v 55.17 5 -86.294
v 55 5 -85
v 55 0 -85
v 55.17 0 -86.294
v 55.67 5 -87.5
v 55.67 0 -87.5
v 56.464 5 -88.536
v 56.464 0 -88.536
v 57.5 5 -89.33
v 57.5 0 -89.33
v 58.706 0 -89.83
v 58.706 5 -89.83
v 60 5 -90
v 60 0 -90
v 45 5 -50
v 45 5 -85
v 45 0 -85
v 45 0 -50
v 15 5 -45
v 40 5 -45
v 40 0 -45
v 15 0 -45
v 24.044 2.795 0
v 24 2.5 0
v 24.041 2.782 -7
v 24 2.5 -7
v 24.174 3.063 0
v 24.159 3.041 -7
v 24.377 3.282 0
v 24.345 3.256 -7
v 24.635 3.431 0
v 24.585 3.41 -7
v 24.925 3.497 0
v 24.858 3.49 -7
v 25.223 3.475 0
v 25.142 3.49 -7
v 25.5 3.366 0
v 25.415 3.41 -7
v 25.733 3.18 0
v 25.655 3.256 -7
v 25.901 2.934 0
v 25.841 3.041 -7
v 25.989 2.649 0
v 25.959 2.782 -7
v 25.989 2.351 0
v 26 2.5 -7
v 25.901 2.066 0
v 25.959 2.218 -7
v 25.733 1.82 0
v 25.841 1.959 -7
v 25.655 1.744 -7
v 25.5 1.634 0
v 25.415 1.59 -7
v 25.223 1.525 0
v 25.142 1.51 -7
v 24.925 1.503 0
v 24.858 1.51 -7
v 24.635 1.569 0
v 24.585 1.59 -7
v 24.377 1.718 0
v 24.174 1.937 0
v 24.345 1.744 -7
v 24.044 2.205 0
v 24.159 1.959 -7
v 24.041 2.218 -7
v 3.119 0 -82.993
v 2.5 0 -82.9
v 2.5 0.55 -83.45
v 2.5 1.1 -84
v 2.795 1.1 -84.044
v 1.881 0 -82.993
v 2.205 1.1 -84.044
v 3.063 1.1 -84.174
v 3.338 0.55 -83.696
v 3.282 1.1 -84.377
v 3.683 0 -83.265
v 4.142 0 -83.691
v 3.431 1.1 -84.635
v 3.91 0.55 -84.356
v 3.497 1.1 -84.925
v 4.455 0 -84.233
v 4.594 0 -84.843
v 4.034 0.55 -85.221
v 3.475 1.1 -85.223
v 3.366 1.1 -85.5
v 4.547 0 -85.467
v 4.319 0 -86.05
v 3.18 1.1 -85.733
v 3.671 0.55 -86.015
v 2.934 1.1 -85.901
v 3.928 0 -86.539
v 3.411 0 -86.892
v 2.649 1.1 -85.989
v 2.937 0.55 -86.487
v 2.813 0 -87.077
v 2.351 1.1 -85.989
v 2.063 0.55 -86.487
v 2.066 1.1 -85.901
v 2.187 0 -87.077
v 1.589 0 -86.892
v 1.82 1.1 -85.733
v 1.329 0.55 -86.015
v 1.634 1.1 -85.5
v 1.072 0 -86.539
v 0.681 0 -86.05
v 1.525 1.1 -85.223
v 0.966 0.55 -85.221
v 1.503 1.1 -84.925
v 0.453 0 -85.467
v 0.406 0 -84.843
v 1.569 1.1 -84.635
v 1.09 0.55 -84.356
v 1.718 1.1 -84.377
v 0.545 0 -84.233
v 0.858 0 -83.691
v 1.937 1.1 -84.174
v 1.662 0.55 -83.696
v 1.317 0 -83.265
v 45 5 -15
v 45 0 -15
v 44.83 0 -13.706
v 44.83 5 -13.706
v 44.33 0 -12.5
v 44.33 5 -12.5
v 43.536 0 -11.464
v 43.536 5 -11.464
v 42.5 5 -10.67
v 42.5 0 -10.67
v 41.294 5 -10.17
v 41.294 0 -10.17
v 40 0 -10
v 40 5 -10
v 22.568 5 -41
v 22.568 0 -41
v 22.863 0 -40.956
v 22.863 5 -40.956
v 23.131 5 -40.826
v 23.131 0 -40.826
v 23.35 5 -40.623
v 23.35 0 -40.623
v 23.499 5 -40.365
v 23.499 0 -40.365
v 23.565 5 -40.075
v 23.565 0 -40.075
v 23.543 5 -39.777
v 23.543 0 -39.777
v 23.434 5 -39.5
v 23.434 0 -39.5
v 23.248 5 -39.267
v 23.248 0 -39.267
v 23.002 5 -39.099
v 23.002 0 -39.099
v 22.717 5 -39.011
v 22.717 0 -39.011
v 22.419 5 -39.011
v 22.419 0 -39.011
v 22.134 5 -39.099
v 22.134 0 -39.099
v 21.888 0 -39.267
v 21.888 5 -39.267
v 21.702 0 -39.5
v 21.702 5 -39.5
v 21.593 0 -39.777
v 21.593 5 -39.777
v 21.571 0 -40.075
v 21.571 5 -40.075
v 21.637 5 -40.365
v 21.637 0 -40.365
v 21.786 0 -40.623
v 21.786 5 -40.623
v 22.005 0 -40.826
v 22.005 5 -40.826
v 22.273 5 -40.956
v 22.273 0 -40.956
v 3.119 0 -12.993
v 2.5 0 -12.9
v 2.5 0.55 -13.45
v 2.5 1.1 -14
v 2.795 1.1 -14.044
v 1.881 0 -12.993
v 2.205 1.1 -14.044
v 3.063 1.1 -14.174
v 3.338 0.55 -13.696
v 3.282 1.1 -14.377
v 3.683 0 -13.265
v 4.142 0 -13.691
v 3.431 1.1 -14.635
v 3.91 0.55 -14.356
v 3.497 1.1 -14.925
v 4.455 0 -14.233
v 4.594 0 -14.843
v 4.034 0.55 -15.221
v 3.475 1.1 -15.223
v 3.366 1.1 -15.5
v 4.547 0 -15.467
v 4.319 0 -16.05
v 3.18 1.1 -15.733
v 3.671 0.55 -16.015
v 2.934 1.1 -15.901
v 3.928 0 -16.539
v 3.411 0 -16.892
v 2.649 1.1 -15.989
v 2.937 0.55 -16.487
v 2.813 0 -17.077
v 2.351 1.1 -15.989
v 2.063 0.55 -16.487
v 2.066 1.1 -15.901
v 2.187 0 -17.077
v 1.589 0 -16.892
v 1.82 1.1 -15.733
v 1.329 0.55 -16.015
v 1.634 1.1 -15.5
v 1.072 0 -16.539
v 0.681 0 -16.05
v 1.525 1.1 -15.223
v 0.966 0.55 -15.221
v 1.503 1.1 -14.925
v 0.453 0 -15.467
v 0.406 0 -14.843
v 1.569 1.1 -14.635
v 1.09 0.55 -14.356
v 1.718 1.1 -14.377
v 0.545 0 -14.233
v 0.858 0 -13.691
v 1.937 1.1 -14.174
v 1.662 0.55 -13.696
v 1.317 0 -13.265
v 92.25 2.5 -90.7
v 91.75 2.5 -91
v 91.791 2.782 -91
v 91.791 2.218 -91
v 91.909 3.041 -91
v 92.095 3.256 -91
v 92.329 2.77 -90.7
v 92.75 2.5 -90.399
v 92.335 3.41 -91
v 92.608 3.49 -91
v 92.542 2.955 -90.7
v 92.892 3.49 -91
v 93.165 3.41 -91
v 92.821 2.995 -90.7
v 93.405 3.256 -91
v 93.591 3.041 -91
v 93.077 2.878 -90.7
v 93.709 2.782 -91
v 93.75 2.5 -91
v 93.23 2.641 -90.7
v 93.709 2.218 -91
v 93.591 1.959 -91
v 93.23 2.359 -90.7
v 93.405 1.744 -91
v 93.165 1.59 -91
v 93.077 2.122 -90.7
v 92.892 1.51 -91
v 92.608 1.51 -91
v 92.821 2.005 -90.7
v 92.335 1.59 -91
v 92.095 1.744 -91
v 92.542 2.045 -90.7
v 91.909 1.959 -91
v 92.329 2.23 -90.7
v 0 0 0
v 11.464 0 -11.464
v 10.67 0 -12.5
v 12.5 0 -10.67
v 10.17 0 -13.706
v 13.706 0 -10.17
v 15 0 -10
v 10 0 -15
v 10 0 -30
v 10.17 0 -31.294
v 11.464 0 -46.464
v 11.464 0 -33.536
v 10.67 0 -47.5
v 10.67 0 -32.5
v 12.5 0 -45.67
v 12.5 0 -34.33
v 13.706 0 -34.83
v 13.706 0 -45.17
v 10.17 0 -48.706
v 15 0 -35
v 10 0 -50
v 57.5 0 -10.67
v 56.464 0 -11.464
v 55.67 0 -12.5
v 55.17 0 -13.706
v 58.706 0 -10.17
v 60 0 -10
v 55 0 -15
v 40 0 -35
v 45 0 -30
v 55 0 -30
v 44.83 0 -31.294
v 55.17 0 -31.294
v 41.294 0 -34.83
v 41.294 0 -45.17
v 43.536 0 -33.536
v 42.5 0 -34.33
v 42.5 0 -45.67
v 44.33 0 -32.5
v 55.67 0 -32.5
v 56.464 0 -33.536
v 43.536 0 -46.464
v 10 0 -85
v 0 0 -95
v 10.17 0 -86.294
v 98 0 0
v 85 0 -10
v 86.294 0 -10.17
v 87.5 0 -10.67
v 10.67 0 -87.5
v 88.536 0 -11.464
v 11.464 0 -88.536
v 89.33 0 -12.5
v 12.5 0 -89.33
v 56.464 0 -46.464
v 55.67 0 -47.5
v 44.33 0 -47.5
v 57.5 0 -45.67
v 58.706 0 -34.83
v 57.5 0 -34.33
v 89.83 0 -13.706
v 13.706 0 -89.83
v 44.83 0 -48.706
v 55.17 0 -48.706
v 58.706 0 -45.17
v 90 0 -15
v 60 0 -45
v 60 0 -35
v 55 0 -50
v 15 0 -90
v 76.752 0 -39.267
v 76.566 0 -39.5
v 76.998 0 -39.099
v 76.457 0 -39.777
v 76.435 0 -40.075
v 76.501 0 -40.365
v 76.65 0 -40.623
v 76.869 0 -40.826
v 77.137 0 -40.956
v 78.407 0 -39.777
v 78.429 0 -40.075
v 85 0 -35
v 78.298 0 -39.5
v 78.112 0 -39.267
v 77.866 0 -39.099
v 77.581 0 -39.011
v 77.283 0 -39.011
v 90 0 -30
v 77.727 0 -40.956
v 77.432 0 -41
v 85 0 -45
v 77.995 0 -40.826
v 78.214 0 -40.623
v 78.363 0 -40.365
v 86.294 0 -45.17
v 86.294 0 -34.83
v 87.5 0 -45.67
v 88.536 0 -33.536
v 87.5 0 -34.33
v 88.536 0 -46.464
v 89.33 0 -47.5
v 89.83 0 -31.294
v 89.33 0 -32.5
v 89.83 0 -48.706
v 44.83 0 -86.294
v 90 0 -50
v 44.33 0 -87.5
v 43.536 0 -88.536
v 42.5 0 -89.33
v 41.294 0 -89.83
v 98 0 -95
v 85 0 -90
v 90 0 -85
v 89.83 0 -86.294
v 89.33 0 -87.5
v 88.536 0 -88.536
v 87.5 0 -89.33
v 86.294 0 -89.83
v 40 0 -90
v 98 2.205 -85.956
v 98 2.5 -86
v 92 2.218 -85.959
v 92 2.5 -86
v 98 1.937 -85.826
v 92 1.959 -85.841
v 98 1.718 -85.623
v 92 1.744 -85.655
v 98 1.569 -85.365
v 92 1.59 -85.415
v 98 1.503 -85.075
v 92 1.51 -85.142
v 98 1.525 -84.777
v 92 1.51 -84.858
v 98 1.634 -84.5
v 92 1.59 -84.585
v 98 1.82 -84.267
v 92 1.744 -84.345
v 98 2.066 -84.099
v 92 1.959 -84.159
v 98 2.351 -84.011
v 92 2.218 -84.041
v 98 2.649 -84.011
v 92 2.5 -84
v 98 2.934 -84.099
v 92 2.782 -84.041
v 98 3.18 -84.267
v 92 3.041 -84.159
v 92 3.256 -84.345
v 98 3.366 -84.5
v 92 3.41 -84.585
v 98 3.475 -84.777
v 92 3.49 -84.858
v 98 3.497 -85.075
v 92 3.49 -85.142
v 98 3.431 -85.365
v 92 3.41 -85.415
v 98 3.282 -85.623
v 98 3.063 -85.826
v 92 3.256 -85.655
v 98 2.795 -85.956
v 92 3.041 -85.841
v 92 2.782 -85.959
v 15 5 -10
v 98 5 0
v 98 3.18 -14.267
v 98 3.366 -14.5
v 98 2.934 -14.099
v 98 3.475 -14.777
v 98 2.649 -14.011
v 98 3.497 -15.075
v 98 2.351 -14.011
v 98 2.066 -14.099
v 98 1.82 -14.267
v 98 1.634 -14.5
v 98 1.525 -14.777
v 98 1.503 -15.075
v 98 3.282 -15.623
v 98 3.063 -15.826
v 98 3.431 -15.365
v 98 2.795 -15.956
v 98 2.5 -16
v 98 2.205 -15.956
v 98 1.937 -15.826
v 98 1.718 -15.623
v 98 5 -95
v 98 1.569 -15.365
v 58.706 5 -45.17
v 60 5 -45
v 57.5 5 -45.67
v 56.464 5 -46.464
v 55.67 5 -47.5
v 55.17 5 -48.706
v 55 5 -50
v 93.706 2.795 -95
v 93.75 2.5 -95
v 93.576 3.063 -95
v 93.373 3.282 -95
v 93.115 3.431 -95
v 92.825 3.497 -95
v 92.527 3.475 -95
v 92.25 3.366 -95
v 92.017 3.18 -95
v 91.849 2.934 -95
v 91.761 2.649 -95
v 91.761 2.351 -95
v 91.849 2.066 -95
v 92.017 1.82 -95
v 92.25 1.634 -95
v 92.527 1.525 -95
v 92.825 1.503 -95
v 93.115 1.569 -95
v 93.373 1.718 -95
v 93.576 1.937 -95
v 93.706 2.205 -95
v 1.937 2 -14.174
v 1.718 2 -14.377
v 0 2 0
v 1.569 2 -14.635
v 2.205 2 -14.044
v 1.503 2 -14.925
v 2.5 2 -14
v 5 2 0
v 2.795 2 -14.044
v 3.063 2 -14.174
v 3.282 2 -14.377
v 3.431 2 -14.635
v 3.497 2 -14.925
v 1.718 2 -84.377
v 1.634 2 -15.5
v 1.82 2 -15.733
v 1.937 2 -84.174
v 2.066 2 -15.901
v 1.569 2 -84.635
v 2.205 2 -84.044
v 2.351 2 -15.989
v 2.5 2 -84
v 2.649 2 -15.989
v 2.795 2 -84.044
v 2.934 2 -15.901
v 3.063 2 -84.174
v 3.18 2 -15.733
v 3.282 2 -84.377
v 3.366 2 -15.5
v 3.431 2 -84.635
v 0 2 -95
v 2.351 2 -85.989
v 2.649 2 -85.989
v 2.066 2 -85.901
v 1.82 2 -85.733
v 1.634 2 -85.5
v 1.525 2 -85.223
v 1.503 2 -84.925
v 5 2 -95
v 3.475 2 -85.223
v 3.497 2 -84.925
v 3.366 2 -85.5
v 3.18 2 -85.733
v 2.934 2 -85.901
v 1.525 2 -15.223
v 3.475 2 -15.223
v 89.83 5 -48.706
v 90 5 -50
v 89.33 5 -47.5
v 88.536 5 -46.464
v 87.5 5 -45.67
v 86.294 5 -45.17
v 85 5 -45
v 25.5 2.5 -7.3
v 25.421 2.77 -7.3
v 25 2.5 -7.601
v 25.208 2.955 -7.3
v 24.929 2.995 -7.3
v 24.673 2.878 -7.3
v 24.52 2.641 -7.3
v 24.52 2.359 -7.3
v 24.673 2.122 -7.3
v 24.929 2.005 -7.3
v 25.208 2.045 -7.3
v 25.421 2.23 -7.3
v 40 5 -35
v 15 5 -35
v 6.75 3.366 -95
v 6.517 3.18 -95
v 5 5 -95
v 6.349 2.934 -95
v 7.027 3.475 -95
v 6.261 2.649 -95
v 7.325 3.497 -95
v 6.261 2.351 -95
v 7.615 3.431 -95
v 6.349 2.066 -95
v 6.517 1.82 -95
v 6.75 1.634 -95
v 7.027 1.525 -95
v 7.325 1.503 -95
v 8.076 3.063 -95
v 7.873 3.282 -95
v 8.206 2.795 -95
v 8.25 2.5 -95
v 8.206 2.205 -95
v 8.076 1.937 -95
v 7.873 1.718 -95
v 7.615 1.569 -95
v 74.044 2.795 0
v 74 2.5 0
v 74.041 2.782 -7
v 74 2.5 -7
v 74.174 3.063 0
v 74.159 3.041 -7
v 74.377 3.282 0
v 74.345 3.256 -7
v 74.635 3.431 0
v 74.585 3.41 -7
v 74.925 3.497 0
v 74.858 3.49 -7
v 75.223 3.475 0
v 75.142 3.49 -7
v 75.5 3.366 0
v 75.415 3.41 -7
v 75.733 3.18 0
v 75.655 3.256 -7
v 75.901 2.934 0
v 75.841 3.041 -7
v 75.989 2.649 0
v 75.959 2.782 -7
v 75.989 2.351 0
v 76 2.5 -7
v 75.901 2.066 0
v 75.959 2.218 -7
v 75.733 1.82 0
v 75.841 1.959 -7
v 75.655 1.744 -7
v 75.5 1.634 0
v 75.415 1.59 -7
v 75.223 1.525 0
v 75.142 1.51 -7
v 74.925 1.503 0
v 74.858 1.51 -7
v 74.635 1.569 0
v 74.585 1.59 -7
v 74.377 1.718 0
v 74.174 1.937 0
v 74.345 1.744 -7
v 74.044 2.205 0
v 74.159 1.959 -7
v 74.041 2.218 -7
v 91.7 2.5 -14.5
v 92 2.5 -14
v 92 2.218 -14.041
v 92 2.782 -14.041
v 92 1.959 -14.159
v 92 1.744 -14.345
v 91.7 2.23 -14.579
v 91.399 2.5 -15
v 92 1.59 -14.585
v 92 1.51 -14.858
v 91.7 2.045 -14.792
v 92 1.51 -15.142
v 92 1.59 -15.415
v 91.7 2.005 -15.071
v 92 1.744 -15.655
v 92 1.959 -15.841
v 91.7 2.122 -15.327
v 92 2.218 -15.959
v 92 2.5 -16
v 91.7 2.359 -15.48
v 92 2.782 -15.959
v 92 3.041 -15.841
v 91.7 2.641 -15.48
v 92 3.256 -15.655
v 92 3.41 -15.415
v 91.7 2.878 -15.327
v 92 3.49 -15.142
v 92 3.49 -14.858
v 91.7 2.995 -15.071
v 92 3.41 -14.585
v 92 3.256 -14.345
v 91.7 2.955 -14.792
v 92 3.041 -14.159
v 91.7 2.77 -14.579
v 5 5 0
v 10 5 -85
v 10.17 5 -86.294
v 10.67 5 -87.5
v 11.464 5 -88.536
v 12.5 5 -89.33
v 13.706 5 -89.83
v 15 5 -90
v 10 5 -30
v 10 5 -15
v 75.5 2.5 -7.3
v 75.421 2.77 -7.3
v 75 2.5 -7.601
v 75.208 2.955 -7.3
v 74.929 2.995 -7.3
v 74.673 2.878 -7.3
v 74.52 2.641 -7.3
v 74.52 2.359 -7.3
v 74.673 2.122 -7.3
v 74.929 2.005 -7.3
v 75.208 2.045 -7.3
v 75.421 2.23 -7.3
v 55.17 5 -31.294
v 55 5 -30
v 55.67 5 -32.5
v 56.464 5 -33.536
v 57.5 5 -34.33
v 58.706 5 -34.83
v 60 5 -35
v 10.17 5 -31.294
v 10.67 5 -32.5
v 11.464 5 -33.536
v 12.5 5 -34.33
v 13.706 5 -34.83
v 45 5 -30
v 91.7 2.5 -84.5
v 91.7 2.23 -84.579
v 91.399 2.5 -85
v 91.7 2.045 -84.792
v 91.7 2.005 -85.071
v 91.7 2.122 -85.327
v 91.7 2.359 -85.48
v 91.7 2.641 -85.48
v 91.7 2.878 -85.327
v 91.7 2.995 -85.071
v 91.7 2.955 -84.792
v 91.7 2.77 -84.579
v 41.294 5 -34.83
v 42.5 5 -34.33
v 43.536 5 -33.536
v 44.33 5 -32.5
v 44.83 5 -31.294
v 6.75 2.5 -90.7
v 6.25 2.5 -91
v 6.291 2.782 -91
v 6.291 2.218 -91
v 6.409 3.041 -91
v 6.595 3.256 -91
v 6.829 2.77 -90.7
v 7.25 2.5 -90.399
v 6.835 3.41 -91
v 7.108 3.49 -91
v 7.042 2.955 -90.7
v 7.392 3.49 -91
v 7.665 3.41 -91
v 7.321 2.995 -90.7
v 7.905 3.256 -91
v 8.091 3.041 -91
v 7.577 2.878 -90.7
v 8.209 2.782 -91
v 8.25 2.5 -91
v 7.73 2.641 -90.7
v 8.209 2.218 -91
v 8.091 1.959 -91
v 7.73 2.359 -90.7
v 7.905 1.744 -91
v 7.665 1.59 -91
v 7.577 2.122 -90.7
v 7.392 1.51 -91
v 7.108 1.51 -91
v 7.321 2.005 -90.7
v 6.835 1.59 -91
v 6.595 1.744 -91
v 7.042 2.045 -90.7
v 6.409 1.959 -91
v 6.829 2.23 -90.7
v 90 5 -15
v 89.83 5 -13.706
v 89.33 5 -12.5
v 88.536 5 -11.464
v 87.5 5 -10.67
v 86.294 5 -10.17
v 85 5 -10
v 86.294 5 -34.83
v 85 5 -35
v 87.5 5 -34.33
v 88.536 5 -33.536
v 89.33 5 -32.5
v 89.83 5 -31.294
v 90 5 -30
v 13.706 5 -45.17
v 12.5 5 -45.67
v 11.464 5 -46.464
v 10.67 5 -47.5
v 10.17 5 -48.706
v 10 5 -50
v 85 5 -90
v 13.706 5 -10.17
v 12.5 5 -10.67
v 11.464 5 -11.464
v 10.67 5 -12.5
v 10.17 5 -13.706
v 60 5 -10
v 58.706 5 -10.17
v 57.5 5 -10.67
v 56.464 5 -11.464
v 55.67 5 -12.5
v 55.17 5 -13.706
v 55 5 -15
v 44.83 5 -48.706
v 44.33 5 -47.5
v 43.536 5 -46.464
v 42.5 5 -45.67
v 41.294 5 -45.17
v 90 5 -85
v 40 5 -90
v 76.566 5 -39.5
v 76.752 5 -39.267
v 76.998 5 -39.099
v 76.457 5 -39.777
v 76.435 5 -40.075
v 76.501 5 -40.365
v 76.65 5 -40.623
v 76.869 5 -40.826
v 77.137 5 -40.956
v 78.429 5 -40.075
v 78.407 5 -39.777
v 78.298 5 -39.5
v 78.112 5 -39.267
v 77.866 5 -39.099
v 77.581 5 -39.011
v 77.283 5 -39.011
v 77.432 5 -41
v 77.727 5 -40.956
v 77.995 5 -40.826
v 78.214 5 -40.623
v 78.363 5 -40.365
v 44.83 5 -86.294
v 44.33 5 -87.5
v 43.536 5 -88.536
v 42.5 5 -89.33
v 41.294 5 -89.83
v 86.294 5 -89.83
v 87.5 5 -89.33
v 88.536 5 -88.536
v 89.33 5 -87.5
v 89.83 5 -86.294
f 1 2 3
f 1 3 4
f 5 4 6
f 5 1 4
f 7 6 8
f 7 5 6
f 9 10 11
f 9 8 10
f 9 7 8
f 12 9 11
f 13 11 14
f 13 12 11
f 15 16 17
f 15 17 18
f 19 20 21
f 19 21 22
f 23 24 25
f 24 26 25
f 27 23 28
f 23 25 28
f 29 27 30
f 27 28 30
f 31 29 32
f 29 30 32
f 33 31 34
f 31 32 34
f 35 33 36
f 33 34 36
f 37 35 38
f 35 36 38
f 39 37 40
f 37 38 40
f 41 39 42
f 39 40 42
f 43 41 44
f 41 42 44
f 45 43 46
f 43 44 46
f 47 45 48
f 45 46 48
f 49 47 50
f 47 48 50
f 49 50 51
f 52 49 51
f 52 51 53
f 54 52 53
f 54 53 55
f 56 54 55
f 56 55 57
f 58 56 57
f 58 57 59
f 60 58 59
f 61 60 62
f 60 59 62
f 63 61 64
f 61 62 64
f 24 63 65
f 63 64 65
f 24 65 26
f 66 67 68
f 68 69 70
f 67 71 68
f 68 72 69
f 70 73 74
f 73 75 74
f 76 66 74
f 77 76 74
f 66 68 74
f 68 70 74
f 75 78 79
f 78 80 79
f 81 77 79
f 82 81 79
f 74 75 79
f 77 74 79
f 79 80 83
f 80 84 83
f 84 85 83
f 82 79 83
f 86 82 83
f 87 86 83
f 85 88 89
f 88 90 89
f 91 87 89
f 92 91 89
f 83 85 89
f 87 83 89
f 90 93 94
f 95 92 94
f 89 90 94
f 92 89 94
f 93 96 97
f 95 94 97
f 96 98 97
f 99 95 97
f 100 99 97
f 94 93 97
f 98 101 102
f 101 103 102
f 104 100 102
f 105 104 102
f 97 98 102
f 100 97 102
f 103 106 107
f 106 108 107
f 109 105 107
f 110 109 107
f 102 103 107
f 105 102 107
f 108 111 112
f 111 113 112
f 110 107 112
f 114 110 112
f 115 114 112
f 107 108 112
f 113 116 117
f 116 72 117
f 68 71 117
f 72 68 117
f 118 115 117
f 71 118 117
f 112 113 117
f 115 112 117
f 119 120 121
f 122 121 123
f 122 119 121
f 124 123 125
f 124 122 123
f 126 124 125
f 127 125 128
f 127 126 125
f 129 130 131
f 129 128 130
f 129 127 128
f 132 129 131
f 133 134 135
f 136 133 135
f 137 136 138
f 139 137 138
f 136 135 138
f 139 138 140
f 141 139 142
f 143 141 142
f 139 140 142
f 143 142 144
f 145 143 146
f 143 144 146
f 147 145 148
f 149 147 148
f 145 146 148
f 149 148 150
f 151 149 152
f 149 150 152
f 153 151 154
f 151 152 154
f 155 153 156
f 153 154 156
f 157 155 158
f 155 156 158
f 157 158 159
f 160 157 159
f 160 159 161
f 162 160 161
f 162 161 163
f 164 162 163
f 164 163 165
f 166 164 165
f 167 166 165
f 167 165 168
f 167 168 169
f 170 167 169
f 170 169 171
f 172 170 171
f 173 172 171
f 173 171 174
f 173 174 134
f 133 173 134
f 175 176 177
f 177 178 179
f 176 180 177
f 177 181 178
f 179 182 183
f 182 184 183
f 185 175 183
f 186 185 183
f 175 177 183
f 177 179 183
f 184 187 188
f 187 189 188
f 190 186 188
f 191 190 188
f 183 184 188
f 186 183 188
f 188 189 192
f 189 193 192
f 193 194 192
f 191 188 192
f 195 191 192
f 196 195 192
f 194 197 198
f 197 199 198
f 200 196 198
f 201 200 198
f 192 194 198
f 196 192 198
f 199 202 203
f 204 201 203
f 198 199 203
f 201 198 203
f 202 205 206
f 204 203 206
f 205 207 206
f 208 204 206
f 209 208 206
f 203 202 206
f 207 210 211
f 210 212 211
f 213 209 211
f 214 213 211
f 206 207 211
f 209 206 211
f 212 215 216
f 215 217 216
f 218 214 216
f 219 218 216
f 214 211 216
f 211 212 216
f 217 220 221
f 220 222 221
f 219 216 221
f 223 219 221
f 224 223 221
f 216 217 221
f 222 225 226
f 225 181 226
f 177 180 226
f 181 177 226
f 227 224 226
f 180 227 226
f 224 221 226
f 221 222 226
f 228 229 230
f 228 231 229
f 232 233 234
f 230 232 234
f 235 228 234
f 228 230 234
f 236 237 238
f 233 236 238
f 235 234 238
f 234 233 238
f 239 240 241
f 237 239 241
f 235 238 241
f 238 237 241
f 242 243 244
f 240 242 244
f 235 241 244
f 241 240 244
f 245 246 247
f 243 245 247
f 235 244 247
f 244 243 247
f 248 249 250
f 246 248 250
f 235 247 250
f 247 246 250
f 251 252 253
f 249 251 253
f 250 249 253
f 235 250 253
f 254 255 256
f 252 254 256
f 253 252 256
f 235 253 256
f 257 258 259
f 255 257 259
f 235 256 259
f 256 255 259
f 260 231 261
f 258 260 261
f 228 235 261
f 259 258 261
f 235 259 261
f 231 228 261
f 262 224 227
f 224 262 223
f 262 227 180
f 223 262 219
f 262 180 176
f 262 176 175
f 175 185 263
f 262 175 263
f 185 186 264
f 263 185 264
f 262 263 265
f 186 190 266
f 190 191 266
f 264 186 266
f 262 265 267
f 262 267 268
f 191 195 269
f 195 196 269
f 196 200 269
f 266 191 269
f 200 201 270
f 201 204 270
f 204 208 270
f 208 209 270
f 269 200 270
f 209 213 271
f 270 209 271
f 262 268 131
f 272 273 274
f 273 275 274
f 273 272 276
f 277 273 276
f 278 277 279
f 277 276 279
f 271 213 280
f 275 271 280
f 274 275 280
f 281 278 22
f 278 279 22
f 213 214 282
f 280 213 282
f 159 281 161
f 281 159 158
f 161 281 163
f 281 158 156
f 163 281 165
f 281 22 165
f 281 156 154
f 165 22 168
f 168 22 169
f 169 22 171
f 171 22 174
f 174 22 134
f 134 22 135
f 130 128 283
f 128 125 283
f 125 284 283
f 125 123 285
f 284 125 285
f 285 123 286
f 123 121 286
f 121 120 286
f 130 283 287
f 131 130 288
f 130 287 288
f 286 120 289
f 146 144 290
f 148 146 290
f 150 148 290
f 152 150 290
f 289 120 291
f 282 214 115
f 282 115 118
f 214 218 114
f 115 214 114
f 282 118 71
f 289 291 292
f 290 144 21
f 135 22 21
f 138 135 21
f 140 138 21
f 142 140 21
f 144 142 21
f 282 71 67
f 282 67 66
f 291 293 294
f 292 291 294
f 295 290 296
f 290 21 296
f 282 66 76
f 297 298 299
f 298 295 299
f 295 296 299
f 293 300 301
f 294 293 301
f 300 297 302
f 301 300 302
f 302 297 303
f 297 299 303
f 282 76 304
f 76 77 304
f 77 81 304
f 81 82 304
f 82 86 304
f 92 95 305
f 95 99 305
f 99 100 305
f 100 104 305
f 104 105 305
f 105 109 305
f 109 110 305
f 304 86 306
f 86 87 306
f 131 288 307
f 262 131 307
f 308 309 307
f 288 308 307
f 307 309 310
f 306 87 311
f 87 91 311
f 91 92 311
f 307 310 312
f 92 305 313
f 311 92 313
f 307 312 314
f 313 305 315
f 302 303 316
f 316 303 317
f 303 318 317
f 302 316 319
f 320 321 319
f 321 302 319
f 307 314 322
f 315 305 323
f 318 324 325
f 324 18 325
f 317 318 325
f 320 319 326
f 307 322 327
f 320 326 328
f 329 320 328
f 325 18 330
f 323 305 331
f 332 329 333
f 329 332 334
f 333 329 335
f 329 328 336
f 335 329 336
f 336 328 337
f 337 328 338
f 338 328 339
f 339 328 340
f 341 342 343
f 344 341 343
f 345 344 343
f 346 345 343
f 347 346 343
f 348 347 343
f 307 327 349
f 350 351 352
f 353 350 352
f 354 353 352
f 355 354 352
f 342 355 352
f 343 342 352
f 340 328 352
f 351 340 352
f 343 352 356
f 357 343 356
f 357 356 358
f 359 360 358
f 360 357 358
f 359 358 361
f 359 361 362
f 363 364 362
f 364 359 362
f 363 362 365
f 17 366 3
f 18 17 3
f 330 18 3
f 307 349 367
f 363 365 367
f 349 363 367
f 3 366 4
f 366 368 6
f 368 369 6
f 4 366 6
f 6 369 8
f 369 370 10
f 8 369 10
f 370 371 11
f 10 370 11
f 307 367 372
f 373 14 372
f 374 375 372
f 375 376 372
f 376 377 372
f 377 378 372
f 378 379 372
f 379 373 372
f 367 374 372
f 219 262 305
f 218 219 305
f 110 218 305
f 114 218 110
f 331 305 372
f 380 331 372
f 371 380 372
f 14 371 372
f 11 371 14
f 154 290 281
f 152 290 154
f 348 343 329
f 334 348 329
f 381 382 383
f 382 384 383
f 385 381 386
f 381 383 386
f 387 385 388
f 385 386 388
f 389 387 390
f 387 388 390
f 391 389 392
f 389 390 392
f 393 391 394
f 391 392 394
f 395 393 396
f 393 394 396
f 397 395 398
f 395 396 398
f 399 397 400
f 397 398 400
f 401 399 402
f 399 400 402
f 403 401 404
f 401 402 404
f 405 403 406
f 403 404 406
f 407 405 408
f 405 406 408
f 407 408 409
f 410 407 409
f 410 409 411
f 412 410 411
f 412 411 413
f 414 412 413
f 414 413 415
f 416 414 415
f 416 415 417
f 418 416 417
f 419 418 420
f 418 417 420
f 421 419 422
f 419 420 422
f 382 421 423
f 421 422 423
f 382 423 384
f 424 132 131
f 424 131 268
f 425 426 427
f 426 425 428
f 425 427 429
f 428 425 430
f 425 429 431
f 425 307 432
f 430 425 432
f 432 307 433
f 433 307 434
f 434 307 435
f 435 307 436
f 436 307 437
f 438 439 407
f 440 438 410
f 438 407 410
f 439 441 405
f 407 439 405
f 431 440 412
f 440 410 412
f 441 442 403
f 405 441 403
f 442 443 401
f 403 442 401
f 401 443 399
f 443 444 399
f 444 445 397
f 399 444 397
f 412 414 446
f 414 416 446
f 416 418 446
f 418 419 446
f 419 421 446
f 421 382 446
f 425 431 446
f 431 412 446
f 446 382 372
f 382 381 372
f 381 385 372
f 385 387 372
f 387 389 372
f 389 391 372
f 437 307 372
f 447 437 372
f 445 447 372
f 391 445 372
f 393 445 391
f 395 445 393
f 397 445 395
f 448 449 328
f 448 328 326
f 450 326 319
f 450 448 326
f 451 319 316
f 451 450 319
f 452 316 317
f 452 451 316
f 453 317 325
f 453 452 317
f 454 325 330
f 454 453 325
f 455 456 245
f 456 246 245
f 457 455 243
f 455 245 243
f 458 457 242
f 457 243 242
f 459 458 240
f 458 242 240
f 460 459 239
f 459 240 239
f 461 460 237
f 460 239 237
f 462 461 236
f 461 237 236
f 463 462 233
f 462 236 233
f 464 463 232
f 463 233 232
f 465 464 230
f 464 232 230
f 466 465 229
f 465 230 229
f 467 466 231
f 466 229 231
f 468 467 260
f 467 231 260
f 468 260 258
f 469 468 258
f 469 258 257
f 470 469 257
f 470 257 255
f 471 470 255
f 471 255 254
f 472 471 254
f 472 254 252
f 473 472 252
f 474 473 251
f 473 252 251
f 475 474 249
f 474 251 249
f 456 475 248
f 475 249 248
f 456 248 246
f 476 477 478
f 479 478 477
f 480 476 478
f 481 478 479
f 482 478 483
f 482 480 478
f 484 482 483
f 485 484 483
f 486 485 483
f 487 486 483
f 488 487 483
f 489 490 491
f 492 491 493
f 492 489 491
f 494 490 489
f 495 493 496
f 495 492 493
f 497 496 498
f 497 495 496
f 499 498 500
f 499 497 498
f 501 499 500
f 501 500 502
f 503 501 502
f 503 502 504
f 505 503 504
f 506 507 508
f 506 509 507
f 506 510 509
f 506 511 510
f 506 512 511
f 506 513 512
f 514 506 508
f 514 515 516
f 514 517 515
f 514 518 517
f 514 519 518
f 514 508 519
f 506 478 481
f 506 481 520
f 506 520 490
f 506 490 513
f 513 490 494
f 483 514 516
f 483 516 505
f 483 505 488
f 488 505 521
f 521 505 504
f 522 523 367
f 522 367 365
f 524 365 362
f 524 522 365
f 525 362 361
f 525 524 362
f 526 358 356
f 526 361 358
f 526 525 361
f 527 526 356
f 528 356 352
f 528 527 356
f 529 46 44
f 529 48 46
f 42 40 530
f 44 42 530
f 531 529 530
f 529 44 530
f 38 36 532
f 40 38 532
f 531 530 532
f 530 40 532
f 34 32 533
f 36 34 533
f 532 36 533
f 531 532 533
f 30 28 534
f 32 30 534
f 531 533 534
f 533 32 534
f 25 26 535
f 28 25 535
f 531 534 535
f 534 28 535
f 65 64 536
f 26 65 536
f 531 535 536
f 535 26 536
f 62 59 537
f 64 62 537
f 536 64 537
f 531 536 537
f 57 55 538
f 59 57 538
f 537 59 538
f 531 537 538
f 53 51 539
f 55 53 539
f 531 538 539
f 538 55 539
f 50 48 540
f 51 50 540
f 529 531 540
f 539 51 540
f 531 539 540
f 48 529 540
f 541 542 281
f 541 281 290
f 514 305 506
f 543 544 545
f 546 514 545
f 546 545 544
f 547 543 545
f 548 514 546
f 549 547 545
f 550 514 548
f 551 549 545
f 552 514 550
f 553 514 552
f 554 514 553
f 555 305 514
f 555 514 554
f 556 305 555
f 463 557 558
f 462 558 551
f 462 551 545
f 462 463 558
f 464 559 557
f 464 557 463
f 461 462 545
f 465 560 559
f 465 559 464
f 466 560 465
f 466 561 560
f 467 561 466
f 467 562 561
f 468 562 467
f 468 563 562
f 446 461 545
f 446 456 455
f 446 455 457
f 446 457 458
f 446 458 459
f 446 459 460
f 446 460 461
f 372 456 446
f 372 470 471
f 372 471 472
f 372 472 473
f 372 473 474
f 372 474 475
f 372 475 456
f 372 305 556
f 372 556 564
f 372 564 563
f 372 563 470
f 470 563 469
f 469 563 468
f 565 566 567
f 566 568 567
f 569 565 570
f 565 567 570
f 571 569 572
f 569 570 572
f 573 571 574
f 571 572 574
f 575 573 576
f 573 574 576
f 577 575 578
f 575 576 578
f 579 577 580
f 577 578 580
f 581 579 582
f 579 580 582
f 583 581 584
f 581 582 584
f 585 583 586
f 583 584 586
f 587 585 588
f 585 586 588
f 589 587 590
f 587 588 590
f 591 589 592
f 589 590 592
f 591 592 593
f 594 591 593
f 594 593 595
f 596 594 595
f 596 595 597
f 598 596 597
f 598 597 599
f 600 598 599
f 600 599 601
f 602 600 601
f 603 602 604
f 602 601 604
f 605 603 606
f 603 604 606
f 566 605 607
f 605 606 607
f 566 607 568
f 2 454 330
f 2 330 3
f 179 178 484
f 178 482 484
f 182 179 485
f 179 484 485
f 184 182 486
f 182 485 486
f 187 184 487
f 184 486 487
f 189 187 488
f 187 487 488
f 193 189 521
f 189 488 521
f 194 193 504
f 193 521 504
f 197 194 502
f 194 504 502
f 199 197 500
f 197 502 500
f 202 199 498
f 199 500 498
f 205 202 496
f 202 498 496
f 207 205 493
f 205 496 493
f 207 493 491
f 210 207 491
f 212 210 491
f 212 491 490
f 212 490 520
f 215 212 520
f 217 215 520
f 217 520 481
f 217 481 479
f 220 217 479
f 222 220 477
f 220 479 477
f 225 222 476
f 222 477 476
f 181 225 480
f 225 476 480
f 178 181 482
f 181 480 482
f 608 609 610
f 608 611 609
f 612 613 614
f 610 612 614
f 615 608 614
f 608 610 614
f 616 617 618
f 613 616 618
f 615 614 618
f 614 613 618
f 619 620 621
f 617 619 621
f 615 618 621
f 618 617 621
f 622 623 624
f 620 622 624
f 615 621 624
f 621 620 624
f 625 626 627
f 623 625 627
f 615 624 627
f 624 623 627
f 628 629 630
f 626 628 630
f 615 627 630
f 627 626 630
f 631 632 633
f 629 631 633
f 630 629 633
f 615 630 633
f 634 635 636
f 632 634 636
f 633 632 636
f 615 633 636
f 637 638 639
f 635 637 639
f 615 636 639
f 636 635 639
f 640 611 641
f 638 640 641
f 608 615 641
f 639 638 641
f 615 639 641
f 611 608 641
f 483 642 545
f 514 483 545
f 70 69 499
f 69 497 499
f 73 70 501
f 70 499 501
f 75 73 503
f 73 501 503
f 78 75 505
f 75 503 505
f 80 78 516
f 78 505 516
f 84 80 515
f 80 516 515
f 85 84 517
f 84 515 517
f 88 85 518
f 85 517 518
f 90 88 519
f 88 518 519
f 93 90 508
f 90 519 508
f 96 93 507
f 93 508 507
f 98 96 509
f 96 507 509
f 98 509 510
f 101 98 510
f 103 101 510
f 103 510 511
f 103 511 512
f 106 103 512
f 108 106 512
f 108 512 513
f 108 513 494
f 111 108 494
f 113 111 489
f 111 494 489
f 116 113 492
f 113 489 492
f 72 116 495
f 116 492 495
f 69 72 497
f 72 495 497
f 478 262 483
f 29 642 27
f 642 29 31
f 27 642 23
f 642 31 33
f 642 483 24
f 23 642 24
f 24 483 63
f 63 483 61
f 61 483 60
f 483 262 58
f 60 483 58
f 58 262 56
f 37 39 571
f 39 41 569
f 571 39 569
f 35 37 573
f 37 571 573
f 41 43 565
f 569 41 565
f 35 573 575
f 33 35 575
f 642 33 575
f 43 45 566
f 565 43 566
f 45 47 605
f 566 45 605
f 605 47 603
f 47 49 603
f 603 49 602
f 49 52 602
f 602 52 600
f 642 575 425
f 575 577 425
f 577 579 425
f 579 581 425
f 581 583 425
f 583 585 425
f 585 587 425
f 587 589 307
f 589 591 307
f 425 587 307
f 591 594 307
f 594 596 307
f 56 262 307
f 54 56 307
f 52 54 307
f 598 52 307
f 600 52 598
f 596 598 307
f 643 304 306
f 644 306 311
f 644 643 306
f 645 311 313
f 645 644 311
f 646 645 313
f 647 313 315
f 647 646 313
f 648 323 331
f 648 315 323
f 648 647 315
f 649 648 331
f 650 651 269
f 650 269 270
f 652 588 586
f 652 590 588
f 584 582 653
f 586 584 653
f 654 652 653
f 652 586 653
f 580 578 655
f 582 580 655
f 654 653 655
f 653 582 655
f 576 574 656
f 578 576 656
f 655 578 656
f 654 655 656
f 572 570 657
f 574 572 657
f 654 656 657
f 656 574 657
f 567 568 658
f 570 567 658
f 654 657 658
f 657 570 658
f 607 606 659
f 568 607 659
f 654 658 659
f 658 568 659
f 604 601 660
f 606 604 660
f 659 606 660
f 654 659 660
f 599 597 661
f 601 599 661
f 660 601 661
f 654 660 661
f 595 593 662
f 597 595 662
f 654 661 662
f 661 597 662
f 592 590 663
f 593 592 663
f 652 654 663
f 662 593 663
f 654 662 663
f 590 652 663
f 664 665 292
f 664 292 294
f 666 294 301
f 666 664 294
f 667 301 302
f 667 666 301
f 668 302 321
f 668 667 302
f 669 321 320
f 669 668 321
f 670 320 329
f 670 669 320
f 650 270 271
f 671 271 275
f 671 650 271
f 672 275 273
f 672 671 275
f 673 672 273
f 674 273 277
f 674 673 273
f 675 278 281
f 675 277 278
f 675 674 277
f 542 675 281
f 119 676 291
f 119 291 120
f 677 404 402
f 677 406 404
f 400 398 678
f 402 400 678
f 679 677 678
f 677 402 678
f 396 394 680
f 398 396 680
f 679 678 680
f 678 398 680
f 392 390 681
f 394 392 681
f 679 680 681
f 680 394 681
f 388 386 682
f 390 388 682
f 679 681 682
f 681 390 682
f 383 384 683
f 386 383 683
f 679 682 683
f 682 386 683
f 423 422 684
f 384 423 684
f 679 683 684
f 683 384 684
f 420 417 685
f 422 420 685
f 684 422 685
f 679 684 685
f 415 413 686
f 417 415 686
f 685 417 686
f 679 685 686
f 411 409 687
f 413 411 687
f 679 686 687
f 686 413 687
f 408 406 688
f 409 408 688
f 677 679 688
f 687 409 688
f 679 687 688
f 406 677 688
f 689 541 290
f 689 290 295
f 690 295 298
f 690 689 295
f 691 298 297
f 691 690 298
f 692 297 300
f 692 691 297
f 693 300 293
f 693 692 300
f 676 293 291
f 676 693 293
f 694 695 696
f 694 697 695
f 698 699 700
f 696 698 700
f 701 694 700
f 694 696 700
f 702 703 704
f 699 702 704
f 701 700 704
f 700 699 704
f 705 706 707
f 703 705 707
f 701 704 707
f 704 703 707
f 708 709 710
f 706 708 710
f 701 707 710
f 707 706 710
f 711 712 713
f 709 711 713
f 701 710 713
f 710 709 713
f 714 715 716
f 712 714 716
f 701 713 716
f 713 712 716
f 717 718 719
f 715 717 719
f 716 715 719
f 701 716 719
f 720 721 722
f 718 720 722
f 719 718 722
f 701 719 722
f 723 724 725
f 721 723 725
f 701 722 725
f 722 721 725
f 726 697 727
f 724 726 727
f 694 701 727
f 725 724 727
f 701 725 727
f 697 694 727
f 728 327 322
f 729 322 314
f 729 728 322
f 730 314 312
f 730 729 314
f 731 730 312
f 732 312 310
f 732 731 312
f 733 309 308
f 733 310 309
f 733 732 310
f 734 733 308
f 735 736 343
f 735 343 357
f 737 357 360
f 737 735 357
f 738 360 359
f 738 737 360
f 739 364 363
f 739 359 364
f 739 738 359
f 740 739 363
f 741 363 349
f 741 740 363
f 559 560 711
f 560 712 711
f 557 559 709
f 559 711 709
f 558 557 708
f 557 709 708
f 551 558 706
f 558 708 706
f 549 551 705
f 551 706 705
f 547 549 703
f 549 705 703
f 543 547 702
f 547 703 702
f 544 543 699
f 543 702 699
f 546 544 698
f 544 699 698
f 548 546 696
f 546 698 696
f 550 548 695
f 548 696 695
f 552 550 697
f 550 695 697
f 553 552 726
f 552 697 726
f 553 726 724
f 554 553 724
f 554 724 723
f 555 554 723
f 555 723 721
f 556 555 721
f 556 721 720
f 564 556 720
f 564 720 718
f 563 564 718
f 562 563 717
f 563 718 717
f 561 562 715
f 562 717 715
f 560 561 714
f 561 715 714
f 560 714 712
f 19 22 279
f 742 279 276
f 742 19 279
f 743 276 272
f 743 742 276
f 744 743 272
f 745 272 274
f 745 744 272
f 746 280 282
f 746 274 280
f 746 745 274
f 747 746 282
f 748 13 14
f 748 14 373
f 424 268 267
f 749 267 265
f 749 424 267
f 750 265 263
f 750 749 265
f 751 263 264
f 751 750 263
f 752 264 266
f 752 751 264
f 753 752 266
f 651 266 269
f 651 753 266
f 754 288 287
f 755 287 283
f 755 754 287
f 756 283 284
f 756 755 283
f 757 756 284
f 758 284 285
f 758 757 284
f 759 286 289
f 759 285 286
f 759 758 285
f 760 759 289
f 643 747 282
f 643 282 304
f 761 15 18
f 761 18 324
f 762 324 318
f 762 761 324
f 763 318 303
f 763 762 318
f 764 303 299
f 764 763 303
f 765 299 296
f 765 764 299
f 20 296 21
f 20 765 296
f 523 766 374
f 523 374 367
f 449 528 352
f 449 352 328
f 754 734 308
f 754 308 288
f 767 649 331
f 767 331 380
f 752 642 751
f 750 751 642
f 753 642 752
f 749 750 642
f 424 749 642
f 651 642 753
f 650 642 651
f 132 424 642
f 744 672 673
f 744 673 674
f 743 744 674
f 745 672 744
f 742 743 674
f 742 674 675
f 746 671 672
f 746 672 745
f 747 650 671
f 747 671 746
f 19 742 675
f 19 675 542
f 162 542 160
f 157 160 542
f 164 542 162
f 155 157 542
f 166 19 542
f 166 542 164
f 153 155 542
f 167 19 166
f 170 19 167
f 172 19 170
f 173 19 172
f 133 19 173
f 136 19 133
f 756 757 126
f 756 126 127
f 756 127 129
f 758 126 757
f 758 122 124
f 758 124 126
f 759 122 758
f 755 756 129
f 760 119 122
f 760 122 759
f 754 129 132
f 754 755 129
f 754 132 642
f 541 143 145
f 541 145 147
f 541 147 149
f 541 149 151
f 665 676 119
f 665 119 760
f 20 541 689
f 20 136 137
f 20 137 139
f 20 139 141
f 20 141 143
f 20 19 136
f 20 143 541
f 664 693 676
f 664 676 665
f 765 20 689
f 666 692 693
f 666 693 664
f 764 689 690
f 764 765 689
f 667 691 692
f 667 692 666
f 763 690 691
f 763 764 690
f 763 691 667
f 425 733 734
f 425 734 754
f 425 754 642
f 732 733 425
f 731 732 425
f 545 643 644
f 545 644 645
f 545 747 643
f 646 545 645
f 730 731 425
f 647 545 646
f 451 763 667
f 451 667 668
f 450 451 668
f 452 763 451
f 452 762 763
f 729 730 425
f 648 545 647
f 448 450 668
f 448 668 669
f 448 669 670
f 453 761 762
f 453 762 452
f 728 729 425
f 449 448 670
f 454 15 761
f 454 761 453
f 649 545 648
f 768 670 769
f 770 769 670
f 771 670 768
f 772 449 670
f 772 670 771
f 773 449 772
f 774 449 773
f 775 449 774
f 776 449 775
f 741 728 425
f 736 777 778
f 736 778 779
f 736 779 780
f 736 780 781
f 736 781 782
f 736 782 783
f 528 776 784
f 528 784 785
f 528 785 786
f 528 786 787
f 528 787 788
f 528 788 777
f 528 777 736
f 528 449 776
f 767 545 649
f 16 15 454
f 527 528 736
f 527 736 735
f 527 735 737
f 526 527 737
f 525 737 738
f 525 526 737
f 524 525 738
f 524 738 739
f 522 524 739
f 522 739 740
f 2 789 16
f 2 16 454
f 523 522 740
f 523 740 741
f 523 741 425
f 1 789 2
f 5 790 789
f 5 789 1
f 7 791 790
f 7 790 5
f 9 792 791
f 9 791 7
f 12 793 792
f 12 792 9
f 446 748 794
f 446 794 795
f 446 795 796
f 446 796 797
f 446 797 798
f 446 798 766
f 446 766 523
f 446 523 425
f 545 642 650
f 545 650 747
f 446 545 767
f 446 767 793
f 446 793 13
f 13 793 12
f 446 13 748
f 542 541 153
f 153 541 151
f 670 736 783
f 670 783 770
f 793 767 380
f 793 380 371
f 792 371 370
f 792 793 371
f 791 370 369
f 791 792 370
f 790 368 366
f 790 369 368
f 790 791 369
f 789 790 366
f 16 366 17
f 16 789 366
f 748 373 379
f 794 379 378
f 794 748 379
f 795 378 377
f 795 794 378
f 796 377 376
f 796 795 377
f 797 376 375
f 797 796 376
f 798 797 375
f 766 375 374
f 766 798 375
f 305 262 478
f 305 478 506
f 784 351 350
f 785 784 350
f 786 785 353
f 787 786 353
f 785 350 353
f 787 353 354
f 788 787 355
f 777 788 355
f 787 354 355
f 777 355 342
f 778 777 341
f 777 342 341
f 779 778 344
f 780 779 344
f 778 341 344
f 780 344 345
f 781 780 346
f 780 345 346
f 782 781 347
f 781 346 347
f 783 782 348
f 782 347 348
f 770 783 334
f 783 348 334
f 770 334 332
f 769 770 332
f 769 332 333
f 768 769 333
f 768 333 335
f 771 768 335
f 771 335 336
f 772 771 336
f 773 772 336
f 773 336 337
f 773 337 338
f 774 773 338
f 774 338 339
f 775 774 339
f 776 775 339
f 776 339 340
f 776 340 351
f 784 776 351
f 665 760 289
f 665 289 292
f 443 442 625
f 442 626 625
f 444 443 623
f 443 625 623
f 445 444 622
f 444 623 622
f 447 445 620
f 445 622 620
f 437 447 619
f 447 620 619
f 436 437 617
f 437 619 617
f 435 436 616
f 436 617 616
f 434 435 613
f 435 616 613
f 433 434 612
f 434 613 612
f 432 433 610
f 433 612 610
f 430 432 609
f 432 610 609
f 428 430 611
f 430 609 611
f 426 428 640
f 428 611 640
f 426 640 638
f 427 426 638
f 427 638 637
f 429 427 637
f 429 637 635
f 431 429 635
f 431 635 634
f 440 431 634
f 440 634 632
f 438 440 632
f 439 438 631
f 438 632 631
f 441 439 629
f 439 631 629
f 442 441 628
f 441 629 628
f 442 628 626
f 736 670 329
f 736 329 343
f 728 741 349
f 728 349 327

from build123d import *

# Parameters (mm, degrees)
SKETCH1_W                             = 98
SKETCH1_H                             = 95
BOSS_EXTRUDE1_DEPTH                   = 5
SKETCH6_W                             = 5
SKETCH6_H                             = 95
CUT_EXTRUDE1_DEPTH                    = 3
CUT_EXTRUDE2_DEPTH                    = 6
TAP_DRILL_FOR_M2X0_4_TAP4_D           = 2
TAP_DRILL_FOR_M2X0_4_TAP1_D           = 2
TAP_DRILL_FOR_M2X0_4_TAP1_CSINK_D     = 4.2
TAP_DRILL_FOR_M2X0_4_TAP1_CSINK_ANGLE = 90
TAP_DRILL_FOR_M2X0_4_TAP3_D           = 2
TAP_DRILL_FOR_M2X0_4_TAP3_DEPTH       = 6
TAP_DRILL_FOR_M2X0_4_TAP3_TIP         = 0.600860619
TAP_DRILL_FOR_M2X0_4_TAP5_D           = 2
TAP_DRILL_FOR_M2X0_4_TAP5_DEPTH       = 4
TAP_DRILL_FOR_M2X0_4_TAP5_TIP         = 0.600860619
TAP_DRILL_FOR_M2X0_4_TAP6_D           = 2
TAP_DRILL_FOR_M2X0_4_TAP6_DEPTH       = 7
TAP_DRILL_FOR_M2X0_4_TAP6_TIP         = 0.600860619


with BuildPart() as part:
    # Sketch1 → Boss-Extrude1 (new body)
    with BuildSketch(Plane(origin=(0, 0, 0), x_dir=(1, 0, 0), z_dir=(0, 1, 0))):
        with Locations((49, 47.5)):
            Rectangle(SKETCH1_W, SKETCH1_H)
    extrude(amount=BOSS_EXTRUDE1_DEPTH)

    # Sketch6 → Cut-Extrude1 (cut)
    with BuildSketch(Plane(origin=(0, 5, 0), x_dir=(1, 0, 0), z_dir=(0, 1, 0))):
        with Locations((2.5, 47.5)):
            Rectangle(SKETCH6_W, SKETCH6_H)
    extrude(amount=-CUT_EXTRUDE1_DEPTH, mode=Mode.SUBTRACT)

    # Sketch5 → Cut-Extrude2 (cut, through all)
    with BuildSketch(Plane(origin=(0, 5, 0), x_dir=(1, 0, 0), z_dir=(0, 1, 0))):
        with BuildLine():
            Line((15, 90), (40, 90))
            ThreePointArc((40, 90), (43.535533906, 88.535533906), (45, 85))
            Line((45, 85), (45, 50))
            ThreePointArc((45, 50), (43.535533906, 46.464466094), (40, 45))
            Line((40, 45), (15, 45))
            ThreePointArc((15, 45), (11.464466094, 46.464466094), (10, 50))
            Line((10, 50), (10, 85))
            ThreePointArc((10, 85), (11.464466094, 88.535533906), (15, 90))
        make_face()
        with BuildLine():
            Line((60, 90), (85, 90))
            ThreePointArc((85, 90), (88.535533906, 88.535533906), (90, 85))
            Line((90, 85), (90, 50))
            ThreePointArc((90, 50), (88.535533906, 46.464466094), (85, 45))
            Line((85, 45), (60, 45))
            ThreePointArc((60, 45), (56.464466094, 46.464466094), (55, 50))
            Line((55, 50), (55, 85))
            ThreePointArc((55, 85), (56.464466094, 88.535533906), (60, 90))
        make_face()
        with BuildLine():
            Line((60, 35), (85, 35))
            ThreePointArc((85, 35), (88.535533906, 33.535533906), (90, 30))
            Line((90, 30), (90, 15))
            ThreePointArc((90, 15), (88.535533906, 11.464466094), (85, 10))
            Line((85, 10), (60, 10))
            ThreePointArc((60, 10), (56.464466094, 11.464466094), (55, 15))
            Line((55, 15), (55, 30))
            ThreePointArc((55, 30), (56.464466094, 33.535533906), (60, 35))
        make_face()
        with BuildLine():
            Line((15, 35), (40, 35))
            ThreePointArc((40, 35), (43.535533906, 33.535533906), (45, 30))
            Line((45, 30), (45, 15))
            ThreePointArc((45, 15), (43.535533906, 11.464466094), (40, 10))
            Line((40, 10), (15, 10))
            ThreePointArc((15, 10), (11.464466094, 11.464466094), (10, 15))
            Line((10, 15), (10, 30))
            ThreePointArc((10, 30), (11.464466094, 33.535533906), (15, 35))
        make_face()
    extrude(amount=-CUT_EXTRUDE2_DEPTH, mode=Mode.SUBTRACT)

    # Tap Drill for M2x0.4 Tap4 (through all)
    with Locations(Plane(origin=(22.568, 5, -40), x_dir=(0, 0, 1), z_dir=(0, 1, 0))):
        with Locations((0, 0), (0, 54.864)):
            Hole(TAP_DRILL_FOR_M2X0_4_TAP4_D / 2)

    # Tap Drill for M2x0.4 Tap1 (through all)
    with Locations(Plane(origin=(2.5, 0, -15), x_dir=(0, 0, -1), z_dir=(0, -1, 0))):
        with Locations((0, 0), (70, 0)):
            CounterSinkHole(TAP_DRILL_FOR_M2X0_4_TAP1_D / 2, TAP_DRILL_FOR_M2X0_4_TAP1_CSINK_D / 2, counter_sink_angle=TAP_DRILL_FOR_M2X0_4_TAP1_CSINK_ANGLE)

    # Tap Drill for M2x0.4 Tap3
    with Locations(Plane(origin=(98, 2.5, -15), x_dir=(0, 0, 1), z_dir=(1, 0, 0))):
        with Locations((0, 0), (-70, 0)):
            Hole(TAP_DRILL_FOR_M2X0_4_TAP3_D / 2, depth=TAP_DRILL_FOR_M2X0_4_TAP3_DEPTH)
            with Locations((0, 0, -(TAP_DRILL_FOR_M2X0_4_TAP3_DEPTH + TAP_DRILL_FOR_M2X0_4_TAP3_TIP / 2))):  # 118° drill point
                Cone(0, TAP_DRILL_FOR_M2X0_4_TAP3_D / 2, TAP_DRILL_FOR_M2X0_4_TAP3_TIP, mode=Mode.SUBTRACT)

    # Tap Drill for M2x0.4 Tap5
    with Locations(Plane(origin=(92.75, 2.5, -95), x_dir=(-1, 0, 0), z_dir=(0, 0, -1))):
        with Locations((0, 0), (85.5, 0)):
            Hole(TAP_DRILL_FOR_M2X0_4_TAP5_D / 2, depth=TAP_DRILL_FOR_M2X0_4_TAP5_DEPTH)
            with Locations((0, 0, -(TAP_DRILL_FOR_M2X0_4_TAP5_DEPTH + TAP_DRILL_FOR_M2X0_4_TAP5_TIP / 2))):  # 118° drill point
                Cone(0, TAP_DRILL_FOR_M2X0_4_TAP5_D / 2, TAP_DRILL_FOR_M2X0_4_TAP5_TIP, mode=Mode.SUBTRACT)

    # Tap Drill for M2x0.4 Tap6
    with Locations(Plane(origin=(25, 2.5, 0), x_dir=(1, 0, 0), z_dir=(0, 0, 1))):
        with Locations((0, 0), (50, 0)):
            Hole(TAP_DRILL_FOR_M2X0_4_TAP6_D / 2, depth=TAP_DRILL_FOR_M2X0_4_TAP6_DEPTH)
            with Locations((0, 0, -(TAP_DRILL_FOR_M2X0_4_TAP6_DEPTH + TAP_DRILL_FOR_M2X0_4_TAP6_TIP / 2))):  # 118° drill point
                Cone(0, TAP_DRILL_FOR_M2X0_4_TAP6_D / 2, TAP_DRILL_FOR_M2X0_4_TAP6_TIP, mode=Mode.SUBTRACT)


solid = part.part
